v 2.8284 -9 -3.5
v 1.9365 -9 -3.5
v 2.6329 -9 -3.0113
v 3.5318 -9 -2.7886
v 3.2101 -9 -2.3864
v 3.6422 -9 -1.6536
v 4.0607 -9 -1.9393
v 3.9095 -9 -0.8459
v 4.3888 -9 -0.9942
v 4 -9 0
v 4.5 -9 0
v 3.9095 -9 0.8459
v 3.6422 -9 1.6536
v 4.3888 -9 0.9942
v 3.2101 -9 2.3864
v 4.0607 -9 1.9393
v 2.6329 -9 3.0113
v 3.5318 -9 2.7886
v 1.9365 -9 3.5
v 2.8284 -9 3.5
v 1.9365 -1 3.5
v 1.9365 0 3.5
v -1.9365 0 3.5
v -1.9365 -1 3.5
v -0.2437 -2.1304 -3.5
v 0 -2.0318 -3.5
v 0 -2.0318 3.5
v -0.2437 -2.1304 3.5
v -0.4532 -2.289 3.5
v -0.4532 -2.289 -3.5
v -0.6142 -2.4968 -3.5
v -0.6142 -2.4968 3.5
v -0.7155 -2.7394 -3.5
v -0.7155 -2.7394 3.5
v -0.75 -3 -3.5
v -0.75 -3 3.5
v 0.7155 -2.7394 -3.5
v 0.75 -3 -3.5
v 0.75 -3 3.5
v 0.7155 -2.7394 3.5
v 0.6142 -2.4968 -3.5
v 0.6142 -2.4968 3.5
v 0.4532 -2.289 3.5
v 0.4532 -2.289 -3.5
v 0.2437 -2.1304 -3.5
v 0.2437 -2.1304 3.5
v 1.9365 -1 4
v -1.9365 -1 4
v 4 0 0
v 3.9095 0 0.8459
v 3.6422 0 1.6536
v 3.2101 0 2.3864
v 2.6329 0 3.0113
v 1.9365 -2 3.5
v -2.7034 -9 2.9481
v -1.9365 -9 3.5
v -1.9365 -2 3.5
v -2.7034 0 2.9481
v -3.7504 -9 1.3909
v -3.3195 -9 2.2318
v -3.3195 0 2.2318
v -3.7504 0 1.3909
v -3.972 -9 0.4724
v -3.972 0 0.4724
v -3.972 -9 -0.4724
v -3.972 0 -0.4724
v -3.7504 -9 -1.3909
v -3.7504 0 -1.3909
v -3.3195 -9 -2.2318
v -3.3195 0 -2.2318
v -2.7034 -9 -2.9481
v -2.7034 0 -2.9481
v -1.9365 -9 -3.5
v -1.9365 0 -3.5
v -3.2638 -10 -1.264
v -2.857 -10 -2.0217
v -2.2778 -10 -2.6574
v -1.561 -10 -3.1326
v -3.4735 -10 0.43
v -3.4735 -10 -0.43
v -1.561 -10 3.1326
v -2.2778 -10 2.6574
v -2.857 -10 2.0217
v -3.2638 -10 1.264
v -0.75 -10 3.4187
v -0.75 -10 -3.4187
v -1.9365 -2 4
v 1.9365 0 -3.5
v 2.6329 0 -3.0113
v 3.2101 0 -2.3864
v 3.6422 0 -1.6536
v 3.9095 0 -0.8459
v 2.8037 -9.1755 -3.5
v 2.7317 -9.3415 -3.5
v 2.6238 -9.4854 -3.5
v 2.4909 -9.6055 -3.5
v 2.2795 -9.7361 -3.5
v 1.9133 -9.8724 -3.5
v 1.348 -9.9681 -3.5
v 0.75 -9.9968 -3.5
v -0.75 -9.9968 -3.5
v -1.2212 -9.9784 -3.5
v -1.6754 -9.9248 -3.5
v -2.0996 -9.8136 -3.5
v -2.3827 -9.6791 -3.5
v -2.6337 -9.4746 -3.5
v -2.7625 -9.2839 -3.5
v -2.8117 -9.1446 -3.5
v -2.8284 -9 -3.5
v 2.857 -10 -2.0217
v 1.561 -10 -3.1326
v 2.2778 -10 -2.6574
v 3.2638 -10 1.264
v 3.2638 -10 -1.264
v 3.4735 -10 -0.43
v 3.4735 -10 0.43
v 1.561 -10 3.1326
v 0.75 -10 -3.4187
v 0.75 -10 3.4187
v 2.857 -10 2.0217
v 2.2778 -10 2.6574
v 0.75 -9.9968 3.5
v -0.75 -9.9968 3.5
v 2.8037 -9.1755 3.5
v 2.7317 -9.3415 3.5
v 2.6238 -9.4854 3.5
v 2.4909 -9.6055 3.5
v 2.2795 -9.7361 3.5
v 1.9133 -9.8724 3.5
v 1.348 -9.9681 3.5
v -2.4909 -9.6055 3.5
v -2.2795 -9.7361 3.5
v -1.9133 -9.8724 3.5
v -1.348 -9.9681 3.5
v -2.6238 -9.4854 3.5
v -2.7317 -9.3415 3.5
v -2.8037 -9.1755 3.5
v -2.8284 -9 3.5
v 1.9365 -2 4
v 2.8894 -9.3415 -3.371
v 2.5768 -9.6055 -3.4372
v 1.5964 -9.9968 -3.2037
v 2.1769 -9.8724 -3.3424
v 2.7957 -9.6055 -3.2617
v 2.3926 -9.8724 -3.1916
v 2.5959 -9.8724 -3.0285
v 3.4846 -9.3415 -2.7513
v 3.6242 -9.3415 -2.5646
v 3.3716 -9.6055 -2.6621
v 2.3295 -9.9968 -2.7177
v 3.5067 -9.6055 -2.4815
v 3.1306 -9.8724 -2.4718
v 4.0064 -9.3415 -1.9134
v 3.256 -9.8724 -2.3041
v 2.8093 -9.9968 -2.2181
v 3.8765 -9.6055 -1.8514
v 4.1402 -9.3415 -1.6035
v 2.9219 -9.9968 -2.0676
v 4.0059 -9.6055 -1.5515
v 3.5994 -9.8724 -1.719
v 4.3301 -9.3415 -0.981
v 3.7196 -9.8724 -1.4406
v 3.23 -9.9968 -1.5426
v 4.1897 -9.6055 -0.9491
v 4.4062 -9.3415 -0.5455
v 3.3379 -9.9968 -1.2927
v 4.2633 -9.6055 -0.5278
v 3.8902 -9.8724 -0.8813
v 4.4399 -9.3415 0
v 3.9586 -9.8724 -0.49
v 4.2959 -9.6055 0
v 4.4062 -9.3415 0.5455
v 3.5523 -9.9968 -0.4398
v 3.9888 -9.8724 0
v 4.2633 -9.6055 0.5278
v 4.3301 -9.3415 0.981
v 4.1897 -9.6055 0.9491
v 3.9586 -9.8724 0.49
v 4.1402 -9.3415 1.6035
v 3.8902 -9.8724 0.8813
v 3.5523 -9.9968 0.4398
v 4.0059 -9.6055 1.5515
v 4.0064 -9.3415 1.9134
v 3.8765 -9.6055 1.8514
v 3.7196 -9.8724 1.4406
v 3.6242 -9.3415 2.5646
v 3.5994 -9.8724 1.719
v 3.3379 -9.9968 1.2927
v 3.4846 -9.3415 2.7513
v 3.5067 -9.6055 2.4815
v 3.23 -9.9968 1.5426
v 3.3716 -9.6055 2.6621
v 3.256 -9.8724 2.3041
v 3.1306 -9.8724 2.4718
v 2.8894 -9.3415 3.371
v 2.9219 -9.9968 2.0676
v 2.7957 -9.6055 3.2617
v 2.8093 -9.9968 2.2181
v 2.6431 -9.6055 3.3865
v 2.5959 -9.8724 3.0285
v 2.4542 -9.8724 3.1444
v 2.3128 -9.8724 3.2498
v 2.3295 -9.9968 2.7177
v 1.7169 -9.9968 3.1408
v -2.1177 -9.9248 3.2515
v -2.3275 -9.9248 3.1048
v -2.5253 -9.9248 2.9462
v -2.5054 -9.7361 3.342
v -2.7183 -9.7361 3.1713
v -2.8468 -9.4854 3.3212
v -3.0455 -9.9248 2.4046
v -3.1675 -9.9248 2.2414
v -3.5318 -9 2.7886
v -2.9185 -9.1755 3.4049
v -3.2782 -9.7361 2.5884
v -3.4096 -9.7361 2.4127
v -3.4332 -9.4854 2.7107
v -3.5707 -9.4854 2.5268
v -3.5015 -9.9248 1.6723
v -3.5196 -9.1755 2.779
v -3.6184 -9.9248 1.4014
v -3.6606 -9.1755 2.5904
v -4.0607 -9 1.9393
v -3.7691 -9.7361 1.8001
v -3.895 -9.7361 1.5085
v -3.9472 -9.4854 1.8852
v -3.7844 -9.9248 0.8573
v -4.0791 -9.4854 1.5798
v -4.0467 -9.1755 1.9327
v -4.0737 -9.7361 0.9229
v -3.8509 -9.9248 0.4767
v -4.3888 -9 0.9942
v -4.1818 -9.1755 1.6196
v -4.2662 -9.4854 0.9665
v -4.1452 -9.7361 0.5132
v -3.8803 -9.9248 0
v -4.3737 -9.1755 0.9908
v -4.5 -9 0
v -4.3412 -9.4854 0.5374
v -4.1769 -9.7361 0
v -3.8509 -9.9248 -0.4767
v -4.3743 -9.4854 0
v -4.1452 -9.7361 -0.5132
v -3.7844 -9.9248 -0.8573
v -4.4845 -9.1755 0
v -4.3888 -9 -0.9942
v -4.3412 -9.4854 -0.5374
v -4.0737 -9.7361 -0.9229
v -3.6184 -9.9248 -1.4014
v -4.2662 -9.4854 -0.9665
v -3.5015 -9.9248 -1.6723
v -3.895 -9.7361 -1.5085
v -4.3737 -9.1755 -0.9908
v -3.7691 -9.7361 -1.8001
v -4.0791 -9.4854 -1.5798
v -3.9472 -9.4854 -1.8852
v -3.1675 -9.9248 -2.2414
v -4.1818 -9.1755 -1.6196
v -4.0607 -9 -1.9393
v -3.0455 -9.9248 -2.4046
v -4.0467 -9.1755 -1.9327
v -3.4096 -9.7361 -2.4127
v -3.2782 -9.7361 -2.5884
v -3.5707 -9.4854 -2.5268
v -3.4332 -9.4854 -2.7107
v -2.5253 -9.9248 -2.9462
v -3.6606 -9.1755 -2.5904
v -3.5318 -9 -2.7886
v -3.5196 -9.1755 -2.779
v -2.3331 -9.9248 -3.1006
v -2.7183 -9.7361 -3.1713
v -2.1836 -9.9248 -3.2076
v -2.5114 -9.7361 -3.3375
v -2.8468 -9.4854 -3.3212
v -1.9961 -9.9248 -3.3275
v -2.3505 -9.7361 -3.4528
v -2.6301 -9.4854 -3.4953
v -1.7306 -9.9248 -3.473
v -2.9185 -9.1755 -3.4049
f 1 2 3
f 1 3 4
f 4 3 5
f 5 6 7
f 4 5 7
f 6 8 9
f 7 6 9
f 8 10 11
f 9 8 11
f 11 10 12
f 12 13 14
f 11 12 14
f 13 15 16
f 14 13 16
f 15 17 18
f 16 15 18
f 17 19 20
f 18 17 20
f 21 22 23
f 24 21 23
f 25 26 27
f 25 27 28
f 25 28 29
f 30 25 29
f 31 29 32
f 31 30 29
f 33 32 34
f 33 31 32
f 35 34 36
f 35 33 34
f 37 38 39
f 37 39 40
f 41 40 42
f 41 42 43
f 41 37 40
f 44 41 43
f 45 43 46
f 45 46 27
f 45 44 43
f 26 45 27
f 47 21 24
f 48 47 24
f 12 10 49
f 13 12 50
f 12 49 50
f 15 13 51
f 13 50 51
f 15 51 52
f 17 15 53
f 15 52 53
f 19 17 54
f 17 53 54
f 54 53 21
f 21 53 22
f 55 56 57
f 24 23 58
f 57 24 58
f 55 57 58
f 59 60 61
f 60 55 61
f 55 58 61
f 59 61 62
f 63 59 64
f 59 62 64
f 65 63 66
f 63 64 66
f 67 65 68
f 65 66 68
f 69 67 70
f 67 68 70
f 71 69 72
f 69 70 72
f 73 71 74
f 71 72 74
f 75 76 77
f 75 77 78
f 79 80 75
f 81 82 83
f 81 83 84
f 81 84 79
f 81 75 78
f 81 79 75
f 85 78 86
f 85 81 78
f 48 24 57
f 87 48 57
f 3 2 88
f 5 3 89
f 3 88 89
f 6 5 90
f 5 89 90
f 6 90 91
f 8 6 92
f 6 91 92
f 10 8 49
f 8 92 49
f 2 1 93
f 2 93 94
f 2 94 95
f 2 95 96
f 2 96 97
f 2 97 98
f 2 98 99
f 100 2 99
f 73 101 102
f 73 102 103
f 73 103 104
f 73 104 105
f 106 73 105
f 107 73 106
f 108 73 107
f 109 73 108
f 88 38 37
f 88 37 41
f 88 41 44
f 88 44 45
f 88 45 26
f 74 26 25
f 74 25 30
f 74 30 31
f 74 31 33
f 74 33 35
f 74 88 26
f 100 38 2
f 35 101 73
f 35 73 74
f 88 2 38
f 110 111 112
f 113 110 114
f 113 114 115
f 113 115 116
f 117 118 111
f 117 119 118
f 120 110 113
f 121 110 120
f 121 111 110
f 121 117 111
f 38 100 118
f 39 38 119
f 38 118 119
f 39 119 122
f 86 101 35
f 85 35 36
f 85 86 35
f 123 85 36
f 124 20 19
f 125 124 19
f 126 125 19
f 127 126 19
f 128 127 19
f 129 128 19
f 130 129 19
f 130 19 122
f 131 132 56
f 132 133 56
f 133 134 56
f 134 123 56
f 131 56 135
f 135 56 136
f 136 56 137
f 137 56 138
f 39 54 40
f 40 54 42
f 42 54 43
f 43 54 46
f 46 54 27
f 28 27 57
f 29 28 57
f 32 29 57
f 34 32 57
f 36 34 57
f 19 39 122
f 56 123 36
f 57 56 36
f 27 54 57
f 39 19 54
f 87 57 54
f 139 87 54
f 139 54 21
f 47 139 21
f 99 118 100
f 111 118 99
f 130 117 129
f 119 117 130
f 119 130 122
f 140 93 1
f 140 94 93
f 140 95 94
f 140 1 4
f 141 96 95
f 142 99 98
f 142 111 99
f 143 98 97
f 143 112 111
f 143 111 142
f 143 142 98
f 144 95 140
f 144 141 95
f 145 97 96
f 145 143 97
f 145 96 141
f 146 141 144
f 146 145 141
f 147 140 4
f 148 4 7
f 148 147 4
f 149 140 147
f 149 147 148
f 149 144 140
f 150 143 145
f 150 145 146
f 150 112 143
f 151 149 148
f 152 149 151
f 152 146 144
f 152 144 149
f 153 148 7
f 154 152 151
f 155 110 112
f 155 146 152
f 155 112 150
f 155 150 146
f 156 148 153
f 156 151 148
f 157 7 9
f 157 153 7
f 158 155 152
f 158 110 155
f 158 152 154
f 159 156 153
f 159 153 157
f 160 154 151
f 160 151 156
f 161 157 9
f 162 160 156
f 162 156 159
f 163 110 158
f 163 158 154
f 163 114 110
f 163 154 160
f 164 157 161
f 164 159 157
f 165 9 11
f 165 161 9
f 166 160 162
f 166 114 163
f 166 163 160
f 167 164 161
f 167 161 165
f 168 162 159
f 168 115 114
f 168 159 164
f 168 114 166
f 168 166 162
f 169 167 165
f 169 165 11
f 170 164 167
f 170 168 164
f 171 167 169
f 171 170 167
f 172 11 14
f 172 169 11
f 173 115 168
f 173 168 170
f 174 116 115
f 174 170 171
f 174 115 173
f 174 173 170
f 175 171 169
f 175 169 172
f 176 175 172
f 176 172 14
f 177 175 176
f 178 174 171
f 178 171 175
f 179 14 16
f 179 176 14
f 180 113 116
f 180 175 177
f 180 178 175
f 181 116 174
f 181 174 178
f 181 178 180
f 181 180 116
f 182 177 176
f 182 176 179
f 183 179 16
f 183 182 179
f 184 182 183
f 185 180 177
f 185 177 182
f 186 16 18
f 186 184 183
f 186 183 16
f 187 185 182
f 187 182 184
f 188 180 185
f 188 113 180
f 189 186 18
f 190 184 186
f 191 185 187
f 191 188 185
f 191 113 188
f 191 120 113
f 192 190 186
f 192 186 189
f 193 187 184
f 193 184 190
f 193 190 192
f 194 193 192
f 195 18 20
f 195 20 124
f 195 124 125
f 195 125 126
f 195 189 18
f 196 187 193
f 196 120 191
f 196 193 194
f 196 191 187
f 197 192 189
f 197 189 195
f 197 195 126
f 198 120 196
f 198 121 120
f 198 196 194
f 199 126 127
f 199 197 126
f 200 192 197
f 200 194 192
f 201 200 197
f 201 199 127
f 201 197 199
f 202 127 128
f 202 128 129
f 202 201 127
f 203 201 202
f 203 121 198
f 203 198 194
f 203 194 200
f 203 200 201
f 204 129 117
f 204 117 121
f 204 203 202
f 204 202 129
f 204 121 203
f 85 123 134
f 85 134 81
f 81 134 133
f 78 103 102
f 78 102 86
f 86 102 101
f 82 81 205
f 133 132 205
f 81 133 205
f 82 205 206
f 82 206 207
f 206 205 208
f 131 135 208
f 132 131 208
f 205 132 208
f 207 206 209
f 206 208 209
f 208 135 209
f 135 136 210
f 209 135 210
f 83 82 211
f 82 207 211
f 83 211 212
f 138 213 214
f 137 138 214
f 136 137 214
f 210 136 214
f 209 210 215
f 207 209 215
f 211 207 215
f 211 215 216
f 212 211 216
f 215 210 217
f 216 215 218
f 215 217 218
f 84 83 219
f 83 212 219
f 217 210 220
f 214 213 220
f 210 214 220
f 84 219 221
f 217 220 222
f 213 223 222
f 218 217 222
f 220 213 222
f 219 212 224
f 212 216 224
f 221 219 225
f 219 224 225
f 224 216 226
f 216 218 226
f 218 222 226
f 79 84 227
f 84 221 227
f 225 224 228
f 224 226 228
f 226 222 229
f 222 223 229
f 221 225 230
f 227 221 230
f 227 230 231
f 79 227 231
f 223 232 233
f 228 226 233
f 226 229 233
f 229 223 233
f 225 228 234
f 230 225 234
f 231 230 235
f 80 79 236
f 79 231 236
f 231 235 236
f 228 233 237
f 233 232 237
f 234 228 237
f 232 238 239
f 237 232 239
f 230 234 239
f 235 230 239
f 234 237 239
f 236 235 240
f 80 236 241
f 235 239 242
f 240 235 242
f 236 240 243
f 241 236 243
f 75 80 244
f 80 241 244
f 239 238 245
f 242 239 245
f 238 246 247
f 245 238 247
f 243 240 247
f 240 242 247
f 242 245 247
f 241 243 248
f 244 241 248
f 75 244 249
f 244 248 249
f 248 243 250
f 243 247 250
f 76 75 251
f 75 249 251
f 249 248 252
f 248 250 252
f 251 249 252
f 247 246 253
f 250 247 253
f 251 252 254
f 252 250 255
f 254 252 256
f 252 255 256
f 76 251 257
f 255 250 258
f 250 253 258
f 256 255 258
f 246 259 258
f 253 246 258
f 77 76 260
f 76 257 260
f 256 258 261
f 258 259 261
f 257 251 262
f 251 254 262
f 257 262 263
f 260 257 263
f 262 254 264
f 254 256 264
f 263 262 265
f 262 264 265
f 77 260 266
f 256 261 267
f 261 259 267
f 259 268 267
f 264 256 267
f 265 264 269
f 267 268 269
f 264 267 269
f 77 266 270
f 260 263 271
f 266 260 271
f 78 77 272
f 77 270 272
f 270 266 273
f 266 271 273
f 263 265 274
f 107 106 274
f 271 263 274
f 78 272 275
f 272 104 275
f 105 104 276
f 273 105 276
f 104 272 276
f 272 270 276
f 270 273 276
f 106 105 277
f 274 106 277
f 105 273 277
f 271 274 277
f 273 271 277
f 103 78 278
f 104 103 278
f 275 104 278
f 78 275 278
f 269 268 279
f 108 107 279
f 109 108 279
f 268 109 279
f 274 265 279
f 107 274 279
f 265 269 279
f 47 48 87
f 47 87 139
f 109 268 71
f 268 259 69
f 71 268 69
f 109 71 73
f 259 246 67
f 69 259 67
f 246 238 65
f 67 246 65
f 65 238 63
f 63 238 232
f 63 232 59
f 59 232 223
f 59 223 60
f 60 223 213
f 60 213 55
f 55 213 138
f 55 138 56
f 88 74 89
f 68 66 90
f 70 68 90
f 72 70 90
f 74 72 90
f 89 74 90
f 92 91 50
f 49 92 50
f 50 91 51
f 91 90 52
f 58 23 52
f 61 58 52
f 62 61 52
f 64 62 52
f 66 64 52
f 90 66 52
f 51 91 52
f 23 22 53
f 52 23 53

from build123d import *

# Parameters (mm, degrees)
F1_DEPTH    = 10
F3_DEPTH    = 1
F2_W        = 1.5
F2_H        = 7
F4_DEPTH    = 8
F6_T1_DEPTH = 7
F6_T4_ANGLE = 165.8100193305
F6_T6_ANGLE = 165.8100193305
F7_DEPTH    = 0.5


# Not quite as in the source:
# - a fillet or chamfer that OpenCascade refuses, or shapes differently, is made with other operations: its cross-section is extruded or revolved along the edge and cut away or added


with BuildPart() as f1:
    # F0 (on Front) → F1 (new body)
    with BuildSketch(Plane.XZ):
        with BuildLine():
            ThreePointArc((1.9364916731, -3.5), (3.4457195687, -2.0315060063), (4, 0))
            ThreePointArc((4, 0), (3.4457195687, 2.0315060063), (1.9364916731, 3.5))
            Line((1.9364916731, 3.5), (-1.9364916731, 3.5))
            ThreePointArc((-1.9364916731, 3.5), (-4, 0), (-1.9364916731, -3.5))
            Line((-1.9364916731, -3.5), (1.9364916731, -3.5))
        make_face()
    extrude(amount=F1_DEPTH)

    # F2 (on face) → F3 (join)
    with BuildSketch(Plane.XZ.offset(10)):
        with BuildLine():
            Line((-1.9364916731, 3.5), (-2.8284271247, 3.5))
            ThreePointArc((-2.8284271247, 3.5), (-4.5, 0), (-2.8284271247, -3.5))
            Line((-2.8284271247, -3.5), (-1.9364916731, -3.5))
            ThreePointArc((-1.9364916731, -3.5), (-4, 0), (-1.9364916731, 3.5))
        make_face()
        with BuildLine():
            ThreePointArc((2.8284271247, -3.5), (4.0606601718, -1.9393398282), (4.5, 0))
            ThreePointArc((4.5, 0), (4.0606601718, 1.9393398282), (2.8284271247, 3.5))
            Line((2.8284271247, 3.5), (1.9364916731, 3.5))
            ThreePointArc((1.9364916731, 3.5), (4, 0), (1.9364916731, -3.5))
            Line((1.9364916731, -3.5), (2.8284271247, -3.5))
        make_face()
    extrude(amount=-F3_DEPTH)

    # F2 (on face) → F4 (cut)
    with BuildSketch(Plane.XZ.offset(10)):
        Rectangle(F2_W, F2_H)
    extrude(amount=-F4_DEPTH, mode=Mode.SUBTRACT)

    # F6: fillet of radius 1 on 4 edges, made by hand

    # F6_s2 → F6_t1 (join)
    with BuildSketch(Plane.XY.offset(-3.5)):
        with BuildLine():
            ThreePointArc((0.25, -2), (-0.4571067812, -2.2928932188), (-0.75, -3))
            Line((-0.75, -3), (-0.75, -2))
            Line((-0.75, -2), (0.25, -2))
        make_face()
        with BuildLine():
            ThreePointArc((0.75, -3), (0.4571067812, -2.2928932188), (-0.25, -2))
            Line((-0.25, -2), (0.75, -2))
            Line((0.75, -2), (0.75, -3))
        make_face()
    extrude(amount=F6_T1_DEPTH)

    # F6_s3 → F6_t4 (revolve, cut)
    with BuildSketch(Plane(origin=(0, 0, 0), x_dir=(0, 1, 0), z_dir=(0.9923427412, 0, 0.1235147116))):
        with BuildLine():
            ThreePointArc((-10, 3.5), (-9.7071067812, 4.2071067812), (-9, 4.5))
            Line((-9, 4.5), (-10, 4.5))
            Line((-10, 4.5), (-10, 3.5))
        make_face()
    revolve(axis=Axis((0, -10, 0), (0, -1, 0)), revolution_arc=F6_T4_ANGLE, mode=Mode.SUBTRACT)

    # F6_s5 → F6_t6 (revolve, cut)
    with BuildSketch(Plane(origin=(0, 0, 0), x_dir=(0, 1, 0), z_dir=(-0.9923427412, 0, -0.1235147116))):
        with BuildLine():
            ThreePointArc((-9, 4.5), (-9.7071067812, 4.2071067812), (-10, 3.5))
            Line((-10, 3.5), (-10, 4.5))
            Line((-10, 4.5), (-9, 4.5))
        make_face()
    revolve(axis=Axis((0, -10, 0), (0, -1, 0)), revolution_arc=F6_T6_ANGLE, mode=Mode.SUBTRACT)

    # F5 (on face) → F7 (join)
    with BuildSketch(Plane.XY.offset(3.5)):
        Polygon((-1.9364916731, -1), (-1.9364916731, -2), (-0.75, -2), (0.75, -2), (1.9364916731, -2), (1.9364916731, -1), align=None)
    extrude(amount=F7_DEPTH)


solid = f1.part
